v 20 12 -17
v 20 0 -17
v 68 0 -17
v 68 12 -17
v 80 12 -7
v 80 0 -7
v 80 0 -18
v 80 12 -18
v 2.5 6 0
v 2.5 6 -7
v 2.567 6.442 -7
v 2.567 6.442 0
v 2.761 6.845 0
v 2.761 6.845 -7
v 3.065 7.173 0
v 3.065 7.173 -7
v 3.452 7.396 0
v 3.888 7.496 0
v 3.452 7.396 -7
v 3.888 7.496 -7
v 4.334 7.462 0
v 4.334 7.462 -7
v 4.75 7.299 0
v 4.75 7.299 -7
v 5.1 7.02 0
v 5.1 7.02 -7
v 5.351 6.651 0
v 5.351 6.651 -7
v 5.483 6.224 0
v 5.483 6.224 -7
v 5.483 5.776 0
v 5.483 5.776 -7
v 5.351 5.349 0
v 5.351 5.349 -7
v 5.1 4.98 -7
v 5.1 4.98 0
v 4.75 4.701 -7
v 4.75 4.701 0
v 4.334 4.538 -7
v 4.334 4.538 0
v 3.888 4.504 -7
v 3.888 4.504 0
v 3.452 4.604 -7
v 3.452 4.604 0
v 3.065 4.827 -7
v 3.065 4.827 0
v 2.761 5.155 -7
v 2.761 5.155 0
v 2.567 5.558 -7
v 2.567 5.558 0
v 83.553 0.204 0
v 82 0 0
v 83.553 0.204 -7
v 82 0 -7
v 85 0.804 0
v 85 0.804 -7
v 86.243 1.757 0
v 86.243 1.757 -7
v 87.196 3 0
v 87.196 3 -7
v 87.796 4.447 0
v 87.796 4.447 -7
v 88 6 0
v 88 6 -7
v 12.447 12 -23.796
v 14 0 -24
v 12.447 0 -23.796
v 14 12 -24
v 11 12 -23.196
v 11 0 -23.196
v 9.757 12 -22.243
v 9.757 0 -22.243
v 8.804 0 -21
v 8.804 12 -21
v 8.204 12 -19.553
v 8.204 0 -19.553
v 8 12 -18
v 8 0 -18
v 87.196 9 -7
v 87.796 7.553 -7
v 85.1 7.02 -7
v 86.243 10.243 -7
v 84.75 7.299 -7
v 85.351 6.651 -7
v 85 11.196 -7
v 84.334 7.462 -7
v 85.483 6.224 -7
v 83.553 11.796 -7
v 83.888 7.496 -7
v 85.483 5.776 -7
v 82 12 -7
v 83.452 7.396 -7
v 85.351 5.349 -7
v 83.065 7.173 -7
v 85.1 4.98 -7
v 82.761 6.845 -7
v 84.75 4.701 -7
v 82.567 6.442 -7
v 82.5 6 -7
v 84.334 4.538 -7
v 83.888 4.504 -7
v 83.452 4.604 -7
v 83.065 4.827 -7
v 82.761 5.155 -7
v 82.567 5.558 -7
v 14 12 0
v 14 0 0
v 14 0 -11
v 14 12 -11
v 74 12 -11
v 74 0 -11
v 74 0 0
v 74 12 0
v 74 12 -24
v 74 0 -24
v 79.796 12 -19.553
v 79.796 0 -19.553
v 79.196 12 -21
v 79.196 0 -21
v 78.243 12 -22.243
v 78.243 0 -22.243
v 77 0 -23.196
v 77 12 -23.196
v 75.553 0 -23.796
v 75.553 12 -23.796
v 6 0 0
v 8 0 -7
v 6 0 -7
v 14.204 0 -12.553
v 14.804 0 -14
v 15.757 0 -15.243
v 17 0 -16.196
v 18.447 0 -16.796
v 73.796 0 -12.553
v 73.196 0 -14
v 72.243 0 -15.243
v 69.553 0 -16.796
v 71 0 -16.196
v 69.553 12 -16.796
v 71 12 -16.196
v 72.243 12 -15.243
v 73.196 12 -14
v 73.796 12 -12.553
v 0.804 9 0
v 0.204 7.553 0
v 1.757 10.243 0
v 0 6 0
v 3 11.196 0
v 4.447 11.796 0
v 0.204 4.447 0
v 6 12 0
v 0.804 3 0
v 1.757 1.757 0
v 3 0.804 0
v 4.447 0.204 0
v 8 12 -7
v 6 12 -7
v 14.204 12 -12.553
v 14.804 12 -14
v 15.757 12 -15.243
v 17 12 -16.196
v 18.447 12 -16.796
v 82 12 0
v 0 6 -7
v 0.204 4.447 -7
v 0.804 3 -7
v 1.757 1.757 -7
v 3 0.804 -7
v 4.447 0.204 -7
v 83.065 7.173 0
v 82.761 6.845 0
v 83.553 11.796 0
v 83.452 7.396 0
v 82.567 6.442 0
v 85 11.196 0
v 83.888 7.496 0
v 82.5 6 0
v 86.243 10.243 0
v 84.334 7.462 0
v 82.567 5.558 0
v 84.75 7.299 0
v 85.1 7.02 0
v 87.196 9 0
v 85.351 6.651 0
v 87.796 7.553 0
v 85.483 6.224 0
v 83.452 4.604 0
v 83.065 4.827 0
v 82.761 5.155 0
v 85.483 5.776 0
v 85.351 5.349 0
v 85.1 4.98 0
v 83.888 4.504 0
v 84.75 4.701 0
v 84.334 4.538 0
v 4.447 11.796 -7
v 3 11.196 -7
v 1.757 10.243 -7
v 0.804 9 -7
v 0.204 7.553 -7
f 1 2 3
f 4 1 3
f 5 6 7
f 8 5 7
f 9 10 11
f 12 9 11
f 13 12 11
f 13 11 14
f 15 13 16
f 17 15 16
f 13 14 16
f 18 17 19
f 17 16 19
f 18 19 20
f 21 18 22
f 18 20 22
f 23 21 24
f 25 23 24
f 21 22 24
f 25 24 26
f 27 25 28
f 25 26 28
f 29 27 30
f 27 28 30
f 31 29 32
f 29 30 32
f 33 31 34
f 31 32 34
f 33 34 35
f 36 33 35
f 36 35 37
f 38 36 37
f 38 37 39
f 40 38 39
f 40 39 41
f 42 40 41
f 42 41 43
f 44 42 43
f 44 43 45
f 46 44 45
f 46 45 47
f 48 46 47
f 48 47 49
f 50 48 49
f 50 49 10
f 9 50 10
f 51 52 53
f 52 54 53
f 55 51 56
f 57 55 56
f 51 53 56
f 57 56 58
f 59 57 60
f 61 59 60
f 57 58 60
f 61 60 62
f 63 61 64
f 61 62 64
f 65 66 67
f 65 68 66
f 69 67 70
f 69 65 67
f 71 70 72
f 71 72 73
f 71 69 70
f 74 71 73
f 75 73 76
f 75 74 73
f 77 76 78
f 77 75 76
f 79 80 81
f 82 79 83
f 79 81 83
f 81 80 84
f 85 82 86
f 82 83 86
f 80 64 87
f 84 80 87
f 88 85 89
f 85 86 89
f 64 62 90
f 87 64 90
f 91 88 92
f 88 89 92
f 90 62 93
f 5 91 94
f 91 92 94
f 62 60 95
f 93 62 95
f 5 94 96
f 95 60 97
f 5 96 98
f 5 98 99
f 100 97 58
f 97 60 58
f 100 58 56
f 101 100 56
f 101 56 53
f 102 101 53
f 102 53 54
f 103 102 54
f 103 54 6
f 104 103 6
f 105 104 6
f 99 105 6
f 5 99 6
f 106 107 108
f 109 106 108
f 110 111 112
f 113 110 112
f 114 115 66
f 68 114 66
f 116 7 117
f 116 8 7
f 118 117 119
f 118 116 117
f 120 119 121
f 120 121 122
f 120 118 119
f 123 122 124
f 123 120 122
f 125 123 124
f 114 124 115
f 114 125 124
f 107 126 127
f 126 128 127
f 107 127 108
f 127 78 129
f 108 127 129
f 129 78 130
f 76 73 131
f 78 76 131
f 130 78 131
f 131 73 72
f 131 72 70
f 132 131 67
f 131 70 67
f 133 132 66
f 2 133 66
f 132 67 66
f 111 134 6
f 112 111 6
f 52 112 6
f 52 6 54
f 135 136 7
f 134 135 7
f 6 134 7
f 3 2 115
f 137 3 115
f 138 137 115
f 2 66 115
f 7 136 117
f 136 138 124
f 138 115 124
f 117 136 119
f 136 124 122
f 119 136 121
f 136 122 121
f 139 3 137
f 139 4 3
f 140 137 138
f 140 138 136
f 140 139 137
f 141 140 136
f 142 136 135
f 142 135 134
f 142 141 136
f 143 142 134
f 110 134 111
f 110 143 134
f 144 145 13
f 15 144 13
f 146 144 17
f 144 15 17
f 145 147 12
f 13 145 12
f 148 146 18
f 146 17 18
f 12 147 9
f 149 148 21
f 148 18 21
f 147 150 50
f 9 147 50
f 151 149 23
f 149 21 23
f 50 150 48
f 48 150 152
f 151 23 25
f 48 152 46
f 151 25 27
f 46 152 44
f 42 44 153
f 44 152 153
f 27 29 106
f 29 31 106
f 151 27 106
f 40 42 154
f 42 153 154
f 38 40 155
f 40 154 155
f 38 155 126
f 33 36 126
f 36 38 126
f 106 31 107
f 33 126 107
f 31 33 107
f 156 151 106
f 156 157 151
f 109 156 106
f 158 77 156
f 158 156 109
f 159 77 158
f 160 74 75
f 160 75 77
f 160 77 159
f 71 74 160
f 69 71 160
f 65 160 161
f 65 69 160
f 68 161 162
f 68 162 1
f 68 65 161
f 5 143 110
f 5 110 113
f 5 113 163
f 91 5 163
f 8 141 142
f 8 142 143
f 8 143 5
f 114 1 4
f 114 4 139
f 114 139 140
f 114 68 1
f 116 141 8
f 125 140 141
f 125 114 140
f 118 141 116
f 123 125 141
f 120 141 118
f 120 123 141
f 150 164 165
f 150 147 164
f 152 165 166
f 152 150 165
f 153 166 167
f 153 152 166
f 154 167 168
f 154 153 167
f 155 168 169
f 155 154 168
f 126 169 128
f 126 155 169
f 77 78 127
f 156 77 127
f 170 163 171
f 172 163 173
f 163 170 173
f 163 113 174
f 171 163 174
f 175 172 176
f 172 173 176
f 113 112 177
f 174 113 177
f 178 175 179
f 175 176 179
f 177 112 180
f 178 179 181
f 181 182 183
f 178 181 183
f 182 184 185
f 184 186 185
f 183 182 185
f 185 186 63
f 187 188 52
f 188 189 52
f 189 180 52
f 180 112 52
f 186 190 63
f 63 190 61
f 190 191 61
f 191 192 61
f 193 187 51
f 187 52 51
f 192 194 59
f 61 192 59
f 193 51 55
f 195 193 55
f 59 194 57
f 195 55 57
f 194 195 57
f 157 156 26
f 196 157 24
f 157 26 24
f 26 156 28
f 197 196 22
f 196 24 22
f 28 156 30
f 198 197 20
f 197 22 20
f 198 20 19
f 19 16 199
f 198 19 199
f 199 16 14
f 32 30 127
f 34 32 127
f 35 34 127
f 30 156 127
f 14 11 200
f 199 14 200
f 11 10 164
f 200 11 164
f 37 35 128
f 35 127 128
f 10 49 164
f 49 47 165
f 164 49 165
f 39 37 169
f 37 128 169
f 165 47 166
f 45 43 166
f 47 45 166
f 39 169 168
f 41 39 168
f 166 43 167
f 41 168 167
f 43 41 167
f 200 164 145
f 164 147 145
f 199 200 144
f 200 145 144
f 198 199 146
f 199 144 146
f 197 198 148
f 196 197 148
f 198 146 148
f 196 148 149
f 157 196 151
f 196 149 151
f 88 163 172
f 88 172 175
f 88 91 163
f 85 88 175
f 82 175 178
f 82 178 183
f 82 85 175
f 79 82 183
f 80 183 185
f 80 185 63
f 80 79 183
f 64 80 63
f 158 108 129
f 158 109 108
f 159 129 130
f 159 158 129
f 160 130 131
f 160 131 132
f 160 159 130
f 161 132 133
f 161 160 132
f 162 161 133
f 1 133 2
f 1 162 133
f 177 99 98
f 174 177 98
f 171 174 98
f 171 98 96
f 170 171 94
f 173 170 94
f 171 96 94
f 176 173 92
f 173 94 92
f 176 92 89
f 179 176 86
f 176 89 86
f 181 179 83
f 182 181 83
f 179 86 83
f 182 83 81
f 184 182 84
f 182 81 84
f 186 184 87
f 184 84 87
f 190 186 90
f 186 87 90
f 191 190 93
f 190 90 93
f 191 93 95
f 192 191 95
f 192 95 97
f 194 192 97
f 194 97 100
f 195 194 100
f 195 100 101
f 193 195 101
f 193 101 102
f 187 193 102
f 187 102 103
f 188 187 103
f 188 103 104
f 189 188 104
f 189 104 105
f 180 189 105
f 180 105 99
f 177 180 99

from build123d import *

# Parameters (mm, degrees)
EXTRUDE_2_DEPTH     = 12
SKETCH_6_R          = 1.5
CUT_EXTRUDE_2_DEPTH = 12
FILLET_2_R          = 6


with BuildPart() as part:
    # 草图3 → 凸台-拉伸2 (new body)
    with BuildSketch(Plane(origin=(0, 0, 0), x_dir=(1, 0, 0), z_dir=(0, 1, 0))):
        Polygon((0, 0), (14, 0), (14, 17), (74, 17), (74, 0), (88, 0), (88, 7), (80, 7), (80, 24), (8, 24), (8, 7), (0, 7), align=None)
    extrude(amount=EXTRUDE_2_DEPTH)

    # 草图6 → 切除-拉伸2 (cut)
    with BuildSketch(Plane(origin=(0, 0, -7), x_dir=(-1, 0, 0), z_dir=(0, 0, -1))):
        with Locations((-4, 6)):
            Circle(SKETCH_6_R)
        with Locations((-84, 6)):
            Circle(SKETCH_6_R)
    extrude(amount=-CUT_EXTRUDE_2_DEPTH, mode=Mode.SUBTRACT)

    # 圆角2
    fillet_2_edges = [part.edges().sort_by_distance(p)[0] for p in [
        (14, 6, -17),
        (8, 6, -24),
        (80, 6, -24),
        (74, 6, -17),
        (0, 12, -3.5),
        (0, 0, -3.5),
        (88, 12, -3.5),
        (88, 0, -3.5),
    ]]
    fillet(fillet_2_edges, radius=FILLET_2_R - 0.0001)  # a hair under: the kernel refuses the full size


solid = part.part
